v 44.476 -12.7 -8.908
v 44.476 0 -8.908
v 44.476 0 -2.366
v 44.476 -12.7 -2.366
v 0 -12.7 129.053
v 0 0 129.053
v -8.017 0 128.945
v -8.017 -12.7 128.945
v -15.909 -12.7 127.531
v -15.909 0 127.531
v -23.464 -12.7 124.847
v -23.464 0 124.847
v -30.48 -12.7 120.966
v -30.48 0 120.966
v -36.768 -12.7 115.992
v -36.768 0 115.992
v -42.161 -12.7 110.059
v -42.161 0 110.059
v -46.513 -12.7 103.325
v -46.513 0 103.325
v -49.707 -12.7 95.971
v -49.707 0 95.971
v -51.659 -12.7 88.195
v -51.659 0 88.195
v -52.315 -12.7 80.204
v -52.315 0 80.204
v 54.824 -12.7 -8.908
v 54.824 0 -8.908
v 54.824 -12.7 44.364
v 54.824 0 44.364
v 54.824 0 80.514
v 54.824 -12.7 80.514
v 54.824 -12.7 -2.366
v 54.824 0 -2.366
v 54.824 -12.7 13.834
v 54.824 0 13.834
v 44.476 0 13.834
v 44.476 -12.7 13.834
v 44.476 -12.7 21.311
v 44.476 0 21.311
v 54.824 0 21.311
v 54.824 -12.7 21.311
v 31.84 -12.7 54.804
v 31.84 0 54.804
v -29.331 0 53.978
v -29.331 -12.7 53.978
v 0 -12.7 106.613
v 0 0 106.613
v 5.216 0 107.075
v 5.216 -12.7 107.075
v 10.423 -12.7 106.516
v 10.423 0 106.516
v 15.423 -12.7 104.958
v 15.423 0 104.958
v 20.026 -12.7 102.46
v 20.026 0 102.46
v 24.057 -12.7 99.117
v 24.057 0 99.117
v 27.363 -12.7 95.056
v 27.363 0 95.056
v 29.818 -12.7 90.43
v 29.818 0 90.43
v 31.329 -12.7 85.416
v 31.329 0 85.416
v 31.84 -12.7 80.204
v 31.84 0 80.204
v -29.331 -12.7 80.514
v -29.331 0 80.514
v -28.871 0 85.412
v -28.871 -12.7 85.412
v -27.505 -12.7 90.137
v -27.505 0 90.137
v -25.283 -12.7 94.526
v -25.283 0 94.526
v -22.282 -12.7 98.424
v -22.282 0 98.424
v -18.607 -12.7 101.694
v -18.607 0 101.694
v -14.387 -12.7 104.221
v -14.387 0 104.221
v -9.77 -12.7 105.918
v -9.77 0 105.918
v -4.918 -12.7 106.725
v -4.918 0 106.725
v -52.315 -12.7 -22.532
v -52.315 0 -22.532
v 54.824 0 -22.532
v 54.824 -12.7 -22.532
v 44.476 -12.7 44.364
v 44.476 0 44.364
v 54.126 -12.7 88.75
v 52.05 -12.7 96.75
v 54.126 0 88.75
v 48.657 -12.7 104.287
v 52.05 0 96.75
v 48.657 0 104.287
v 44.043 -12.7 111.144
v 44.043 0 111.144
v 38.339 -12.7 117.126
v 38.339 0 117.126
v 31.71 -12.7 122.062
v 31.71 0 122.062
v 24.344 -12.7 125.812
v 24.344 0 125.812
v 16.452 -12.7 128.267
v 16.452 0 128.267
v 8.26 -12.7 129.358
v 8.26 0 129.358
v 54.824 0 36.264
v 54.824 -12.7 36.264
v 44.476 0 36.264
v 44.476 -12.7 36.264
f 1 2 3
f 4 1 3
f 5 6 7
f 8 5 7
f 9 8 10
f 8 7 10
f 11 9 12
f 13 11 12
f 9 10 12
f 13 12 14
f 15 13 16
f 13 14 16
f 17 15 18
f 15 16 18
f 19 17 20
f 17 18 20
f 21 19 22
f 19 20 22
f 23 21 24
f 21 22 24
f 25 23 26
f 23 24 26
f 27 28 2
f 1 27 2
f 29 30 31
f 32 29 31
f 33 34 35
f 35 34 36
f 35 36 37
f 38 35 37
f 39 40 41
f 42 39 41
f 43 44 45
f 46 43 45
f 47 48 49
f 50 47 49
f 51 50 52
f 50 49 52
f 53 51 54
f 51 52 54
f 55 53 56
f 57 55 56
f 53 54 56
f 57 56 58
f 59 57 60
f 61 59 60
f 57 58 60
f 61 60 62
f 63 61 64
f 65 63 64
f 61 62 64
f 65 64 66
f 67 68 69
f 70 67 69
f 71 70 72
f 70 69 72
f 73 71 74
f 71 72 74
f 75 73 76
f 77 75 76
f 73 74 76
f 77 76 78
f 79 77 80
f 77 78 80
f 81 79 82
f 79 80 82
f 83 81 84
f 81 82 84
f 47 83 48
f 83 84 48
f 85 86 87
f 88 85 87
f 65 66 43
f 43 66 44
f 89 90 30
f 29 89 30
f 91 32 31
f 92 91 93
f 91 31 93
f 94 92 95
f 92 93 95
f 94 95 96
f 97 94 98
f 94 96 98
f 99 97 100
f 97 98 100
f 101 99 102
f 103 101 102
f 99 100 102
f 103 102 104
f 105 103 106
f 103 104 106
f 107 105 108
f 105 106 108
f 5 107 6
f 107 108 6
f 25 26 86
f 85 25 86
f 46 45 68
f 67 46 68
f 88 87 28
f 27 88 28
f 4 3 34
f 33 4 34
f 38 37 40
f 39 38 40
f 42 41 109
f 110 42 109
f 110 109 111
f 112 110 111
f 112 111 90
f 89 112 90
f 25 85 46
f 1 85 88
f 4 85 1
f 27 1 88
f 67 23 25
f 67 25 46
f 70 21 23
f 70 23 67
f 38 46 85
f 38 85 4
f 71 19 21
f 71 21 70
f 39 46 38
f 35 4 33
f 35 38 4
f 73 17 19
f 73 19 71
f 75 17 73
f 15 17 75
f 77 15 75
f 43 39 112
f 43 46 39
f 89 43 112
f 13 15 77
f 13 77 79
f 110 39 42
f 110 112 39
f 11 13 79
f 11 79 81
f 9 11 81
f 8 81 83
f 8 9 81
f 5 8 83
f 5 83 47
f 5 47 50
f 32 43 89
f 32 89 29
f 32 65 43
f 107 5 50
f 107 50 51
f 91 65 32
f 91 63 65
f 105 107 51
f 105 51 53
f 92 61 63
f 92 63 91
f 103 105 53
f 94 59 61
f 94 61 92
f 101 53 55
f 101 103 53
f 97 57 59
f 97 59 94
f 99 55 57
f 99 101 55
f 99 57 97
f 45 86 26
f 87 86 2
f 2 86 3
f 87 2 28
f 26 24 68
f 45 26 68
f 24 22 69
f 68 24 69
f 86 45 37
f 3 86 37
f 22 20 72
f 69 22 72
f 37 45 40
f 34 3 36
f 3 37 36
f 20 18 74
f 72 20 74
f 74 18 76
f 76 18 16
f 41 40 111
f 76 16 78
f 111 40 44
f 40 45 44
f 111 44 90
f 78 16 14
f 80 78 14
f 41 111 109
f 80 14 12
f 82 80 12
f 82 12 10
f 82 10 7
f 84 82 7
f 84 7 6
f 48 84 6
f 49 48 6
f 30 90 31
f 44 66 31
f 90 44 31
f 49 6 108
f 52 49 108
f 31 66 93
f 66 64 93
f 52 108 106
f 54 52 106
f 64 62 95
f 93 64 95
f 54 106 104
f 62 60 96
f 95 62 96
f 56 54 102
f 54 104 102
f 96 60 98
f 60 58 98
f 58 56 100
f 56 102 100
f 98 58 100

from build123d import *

# Parameters (mm, degrees)
F1_DEPTH = 6.35
F2_DEPTH = 12.7


with BuildPart() as f1:
    # F0 (on Front) → F1 (new body)
    with BuildSketch(Plane.XZ):
        Polygon((-29.3310899078, 53.6682253753), (-52.3154214025, 53.6682253753), (-52.3154214025, -22.5317746247), (54.824039946, -22.5317746247), (54.824039946, -8.9082447812), (44.4758199155, -8.9082447812), (44.4758199155, -2.3659907747), (54.824039946, -2.3659907747), (54.824039946, 13.8338748366), (44.4758199155, 13.8338748366), (44.4758199155, 21.3107354939), (54.824039946, 21.3107354939), (54.824039946, 36.2644605339), (44.4758199155, 36.2644605339), (44.4758199155, 44.3643927574), (54.824039946, 44.3643927574), (54.824039946, 55.1141475241), (31.8397084513, 54.8039578557), (-29.3310899078, 53.9784150436), align=None)
    extrude(amount=F1_DEPTH)

    # F0 (on Front) → F2 (join)
    with BuildSketch(Plane.XZ):
        Polygon((-29.3310899078, 53.6682253753), (-52.3154214025, 53.6682253753), (-52.3154214025, -22.5317746247), (54.824039946, -22.5317746247), (54.824039946, -8.9082447812), (44.4758199155, -8.9082447812), (44.4758199155, -2.3659907747), (54.824039946, -2.3659907747), (54.824039946, 13.8338748366), (44.4758199155, 13.8338748366), (44.4758199155, 21.3107354939), (54.824039946, 21.3107354939), (54.824039946, 36.2644605339), (44.4758199155, 36.2644605339), (44.4758199155, 44.3643927574), (54.824039946, 44.3643927574), (54.824039946, 55.1141475241), (31.8397084513, 54.8039578557), (-29.3310899078, 53.9784150436), align=None)
        Polygon((-52.3154214025, 65.8902004361), (-52.3154214025, 53.6682253753), (-29.3310899078, 53.9784150436), (-29.3310899078, 80.5141475241), (-52.3154214025, 80.2039578557), align=None)
        Polygon((-29.3310899078, 53.9784150436), (-52.3154214025, 53.6682253753), (-29.3310899078, 53.6682253753), align=None)
        Polygon((31.8397084513, 80.2039578557), (31.8397084513, 54.8039578557), (54.824039946, 55.1141475241), (54.824039946, 80.5141475241), align=None)
        with BuildLine():
            Line((-52.3154214025, 80.2039578557), (-29.3310899078, 80.5141475241))
            ThreePointArc((-29.3310899078, 80.5141475241), (-20.5215844856, 100.1447961764), (0, 106.6127419472))
            Line((0, 106.6127419472), (0, 129.0534651811))
            ThreePointArc((0, 129.0534651811), (-36.7683139969, 115.9921461392), (-52.3154214025, 80.2039578557))
        make_face()
        with BuildLine():
            ThreePointArc((0, 106.6127419472), (22.12305543, 100.8872295472), (31.8397084513, 80.2039578557))
            Line((31.8397084513, 80.2039578557), (54.824039946, 80.5141475241))
            ThreePointArc((54.824039946, 80.5141475241), (38.3394632715, 117.1261015644), (0, 129.0534651811))
            Line((0, 129.0534651811), (0, 106.6127419472))
        make_face()
    extrude(amount=F2_DEPTH)


solid = f1.part
